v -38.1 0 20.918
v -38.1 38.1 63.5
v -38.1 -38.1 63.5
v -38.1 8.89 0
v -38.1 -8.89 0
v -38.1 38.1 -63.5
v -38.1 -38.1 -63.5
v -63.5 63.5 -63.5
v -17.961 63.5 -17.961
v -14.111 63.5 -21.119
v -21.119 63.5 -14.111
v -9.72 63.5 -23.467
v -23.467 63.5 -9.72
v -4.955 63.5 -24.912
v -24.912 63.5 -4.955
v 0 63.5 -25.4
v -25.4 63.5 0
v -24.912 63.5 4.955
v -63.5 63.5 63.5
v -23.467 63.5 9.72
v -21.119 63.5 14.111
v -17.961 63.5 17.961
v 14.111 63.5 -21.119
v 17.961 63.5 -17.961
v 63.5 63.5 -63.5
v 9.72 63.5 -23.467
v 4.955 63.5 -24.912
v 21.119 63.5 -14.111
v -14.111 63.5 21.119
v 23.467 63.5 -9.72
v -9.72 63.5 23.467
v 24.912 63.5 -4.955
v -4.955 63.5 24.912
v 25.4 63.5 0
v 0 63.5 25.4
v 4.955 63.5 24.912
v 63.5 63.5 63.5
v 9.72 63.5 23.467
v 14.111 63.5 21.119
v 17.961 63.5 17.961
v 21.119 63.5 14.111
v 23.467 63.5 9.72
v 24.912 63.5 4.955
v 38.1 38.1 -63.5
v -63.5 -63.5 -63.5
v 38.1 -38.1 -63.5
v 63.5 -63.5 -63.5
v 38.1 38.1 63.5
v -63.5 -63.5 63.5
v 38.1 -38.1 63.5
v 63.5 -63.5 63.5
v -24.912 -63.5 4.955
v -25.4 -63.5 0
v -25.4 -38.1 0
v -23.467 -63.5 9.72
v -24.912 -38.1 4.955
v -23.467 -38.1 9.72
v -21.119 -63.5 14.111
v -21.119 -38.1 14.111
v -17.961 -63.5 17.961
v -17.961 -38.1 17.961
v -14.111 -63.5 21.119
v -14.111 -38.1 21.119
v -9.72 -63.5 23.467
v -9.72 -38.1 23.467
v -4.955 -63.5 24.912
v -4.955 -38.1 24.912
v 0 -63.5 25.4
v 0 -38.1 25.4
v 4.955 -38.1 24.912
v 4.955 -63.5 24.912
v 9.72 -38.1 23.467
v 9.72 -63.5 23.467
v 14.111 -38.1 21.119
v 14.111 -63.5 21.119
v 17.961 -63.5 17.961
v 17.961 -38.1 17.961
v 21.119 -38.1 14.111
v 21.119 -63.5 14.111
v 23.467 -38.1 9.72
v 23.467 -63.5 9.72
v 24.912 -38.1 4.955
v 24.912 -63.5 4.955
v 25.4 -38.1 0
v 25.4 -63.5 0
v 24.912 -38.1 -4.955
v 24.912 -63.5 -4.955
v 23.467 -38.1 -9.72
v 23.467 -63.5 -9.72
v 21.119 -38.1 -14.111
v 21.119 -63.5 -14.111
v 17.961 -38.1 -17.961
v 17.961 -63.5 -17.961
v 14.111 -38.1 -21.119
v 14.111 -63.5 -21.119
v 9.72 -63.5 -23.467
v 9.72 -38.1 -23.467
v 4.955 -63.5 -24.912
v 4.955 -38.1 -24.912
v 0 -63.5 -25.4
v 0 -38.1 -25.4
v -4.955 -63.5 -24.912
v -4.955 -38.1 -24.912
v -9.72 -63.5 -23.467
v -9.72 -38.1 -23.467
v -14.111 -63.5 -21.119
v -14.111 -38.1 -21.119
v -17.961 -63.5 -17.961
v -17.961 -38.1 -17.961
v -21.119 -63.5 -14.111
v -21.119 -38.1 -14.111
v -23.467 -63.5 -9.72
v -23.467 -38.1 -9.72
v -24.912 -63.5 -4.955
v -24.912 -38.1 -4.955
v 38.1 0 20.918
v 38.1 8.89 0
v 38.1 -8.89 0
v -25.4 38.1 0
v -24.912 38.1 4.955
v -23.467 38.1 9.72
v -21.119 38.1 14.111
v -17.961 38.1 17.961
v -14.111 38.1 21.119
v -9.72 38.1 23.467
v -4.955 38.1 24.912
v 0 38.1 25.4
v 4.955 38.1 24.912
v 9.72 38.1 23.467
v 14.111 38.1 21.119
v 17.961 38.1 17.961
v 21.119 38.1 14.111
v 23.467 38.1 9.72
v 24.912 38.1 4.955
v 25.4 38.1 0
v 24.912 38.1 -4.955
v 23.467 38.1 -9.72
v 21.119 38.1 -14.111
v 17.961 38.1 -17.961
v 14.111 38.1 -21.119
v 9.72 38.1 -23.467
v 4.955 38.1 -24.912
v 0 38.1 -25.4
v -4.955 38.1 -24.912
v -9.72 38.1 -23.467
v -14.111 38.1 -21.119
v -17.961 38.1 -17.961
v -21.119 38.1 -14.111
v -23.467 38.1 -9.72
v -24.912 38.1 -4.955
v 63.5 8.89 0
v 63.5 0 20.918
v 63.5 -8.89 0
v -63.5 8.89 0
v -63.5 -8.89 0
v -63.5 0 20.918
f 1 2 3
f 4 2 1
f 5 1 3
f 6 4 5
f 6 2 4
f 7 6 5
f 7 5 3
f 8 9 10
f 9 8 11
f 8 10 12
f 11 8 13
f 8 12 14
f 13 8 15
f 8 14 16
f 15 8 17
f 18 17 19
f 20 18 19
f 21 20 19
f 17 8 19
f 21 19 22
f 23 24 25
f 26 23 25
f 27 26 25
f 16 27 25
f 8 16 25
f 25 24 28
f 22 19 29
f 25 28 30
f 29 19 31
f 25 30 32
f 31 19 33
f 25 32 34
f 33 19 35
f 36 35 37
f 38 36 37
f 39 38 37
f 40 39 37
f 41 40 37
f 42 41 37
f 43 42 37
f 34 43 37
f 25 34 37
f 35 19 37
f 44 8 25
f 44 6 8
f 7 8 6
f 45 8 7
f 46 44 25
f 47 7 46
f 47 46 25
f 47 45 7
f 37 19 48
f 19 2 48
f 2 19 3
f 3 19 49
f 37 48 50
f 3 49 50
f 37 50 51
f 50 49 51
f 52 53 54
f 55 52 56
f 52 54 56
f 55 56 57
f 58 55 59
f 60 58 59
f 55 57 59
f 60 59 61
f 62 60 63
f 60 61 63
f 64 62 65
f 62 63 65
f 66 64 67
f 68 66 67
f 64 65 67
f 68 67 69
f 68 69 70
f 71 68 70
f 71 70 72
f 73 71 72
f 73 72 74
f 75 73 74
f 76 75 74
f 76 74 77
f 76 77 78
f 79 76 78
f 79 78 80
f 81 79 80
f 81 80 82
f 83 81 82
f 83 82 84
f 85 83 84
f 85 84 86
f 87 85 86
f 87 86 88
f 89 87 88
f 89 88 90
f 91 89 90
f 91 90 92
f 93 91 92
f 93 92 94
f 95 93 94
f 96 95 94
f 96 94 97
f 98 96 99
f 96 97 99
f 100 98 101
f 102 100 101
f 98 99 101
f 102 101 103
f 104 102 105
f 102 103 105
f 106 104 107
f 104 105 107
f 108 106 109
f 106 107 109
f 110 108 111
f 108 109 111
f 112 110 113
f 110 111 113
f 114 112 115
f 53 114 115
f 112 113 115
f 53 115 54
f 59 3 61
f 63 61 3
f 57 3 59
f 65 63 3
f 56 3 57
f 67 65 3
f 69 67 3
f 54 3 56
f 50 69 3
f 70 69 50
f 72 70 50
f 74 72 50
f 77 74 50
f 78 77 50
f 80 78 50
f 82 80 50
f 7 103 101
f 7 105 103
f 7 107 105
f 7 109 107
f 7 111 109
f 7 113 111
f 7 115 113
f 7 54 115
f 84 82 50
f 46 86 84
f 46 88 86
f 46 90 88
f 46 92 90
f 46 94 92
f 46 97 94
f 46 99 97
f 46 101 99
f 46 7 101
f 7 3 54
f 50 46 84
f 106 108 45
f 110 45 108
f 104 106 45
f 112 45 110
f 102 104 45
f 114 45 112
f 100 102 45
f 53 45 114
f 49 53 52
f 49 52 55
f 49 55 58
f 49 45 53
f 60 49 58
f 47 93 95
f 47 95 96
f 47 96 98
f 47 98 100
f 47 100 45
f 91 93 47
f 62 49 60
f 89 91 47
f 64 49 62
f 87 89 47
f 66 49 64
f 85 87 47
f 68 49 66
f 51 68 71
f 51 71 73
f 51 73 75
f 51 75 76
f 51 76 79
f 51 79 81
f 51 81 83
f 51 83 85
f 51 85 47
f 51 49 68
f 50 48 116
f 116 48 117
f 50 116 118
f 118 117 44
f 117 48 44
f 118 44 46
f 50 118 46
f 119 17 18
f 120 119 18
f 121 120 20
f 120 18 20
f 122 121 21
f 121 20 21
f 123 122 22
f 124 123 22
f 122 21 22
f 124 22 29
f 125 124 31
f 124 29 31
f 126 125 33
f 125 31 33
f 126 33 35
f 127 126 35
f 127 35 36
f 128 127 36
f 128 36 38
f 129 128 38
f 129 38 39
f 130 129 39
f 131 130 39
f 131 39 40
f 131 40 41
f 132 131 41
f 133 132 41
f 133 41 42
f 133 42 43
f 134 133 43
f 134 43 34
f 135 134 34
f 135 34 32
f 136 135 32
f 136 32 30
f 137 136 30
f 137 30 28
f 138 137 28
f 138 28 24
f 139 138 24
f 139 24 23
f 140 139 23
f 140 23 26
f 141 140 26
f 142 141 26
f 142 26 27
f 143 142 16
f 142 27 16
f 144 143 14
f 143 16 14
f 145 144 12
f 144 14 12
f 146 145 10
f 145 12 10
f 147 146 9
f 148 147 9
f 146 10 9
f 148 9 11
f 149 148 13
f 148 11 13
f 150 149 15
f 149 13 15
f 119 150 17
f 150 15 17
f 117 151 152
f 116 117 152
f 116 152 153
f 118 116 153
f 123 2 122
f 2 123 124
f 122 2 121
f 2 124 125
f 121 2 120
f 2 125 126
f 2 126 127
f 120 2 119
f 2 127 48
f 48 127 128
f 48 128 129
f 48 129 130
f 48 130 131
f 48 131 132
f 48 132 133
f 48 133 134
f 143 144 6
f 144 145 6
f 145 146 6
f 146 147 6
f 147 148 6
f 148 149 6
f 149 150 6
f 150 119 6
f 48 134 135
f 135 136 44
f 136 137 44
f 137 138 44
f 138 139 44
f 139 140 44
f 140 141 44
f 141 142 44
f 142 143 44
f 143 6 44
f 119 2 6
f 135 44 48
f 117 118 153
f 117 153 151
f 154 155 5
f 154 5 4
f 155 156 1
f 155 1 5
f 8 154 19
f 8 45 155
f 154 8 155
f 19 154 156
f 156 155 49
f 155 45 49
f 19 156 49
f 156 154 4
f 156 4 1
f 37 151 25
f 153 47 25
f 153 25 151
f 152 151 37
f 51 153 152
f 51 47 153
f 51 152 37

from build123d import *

# Parameters (mm, degrees)
F1_W     = 127
F1_H     = 127
F2_DEPTH = 63.5
F3_W     = 76.2
F3_H     = 76.2
F4_DEPTH = 135.636
F6_DEPTH = 146.304
F7_R     = 25.4
F8_DEPTH = 141.986


# Not quite as in the source:
# - a variable given as a bare number and used for a length is read in inches; the dataset says mm whatever the document's units were


with BuildPart() as f2:
    # F1 (on Front) → F2 (new body, symmetric)
    with BuildSketch(Plane.XZ):
        Rectangle(F1_W, F1_H)
    extrude(amount=F2_DEPTH, both=True)

    # F3 (on face) → F4 (cut)
    with BuildSketch(Plane(origin=(0, 0, -63.5), x_dir=(1, 0, 0), z_dir=(0, 0, -1))):
        Rectangle(F3_W, F3_H)
    extrude(amount=-F4_DEPTH, mode=Mode.SUBTRACT)

    # F5 (on face) → F6 (cut)
    with BuildSketch(Plane.YZ.offset(63.5)):
        Polygon((8.8900011033, 0), (0, 20.9176484495), (-8.8900011033, 0), align=None)
    extrude(amount=-F6_DEPTH, mode=Mode.SUBTRACT)

    # F7 (on face) → F8 (cut)
    with BuildSketch(Plane(origin=(0, 63.5, 0), x_dir=(-1, 0, 0), z_dir=(0, 1, 0))):
        Circle(F7_R)
    extrude(amount=-F8_DEPTH, mode=Mode.SUBTRACT)


solid = f2.part
